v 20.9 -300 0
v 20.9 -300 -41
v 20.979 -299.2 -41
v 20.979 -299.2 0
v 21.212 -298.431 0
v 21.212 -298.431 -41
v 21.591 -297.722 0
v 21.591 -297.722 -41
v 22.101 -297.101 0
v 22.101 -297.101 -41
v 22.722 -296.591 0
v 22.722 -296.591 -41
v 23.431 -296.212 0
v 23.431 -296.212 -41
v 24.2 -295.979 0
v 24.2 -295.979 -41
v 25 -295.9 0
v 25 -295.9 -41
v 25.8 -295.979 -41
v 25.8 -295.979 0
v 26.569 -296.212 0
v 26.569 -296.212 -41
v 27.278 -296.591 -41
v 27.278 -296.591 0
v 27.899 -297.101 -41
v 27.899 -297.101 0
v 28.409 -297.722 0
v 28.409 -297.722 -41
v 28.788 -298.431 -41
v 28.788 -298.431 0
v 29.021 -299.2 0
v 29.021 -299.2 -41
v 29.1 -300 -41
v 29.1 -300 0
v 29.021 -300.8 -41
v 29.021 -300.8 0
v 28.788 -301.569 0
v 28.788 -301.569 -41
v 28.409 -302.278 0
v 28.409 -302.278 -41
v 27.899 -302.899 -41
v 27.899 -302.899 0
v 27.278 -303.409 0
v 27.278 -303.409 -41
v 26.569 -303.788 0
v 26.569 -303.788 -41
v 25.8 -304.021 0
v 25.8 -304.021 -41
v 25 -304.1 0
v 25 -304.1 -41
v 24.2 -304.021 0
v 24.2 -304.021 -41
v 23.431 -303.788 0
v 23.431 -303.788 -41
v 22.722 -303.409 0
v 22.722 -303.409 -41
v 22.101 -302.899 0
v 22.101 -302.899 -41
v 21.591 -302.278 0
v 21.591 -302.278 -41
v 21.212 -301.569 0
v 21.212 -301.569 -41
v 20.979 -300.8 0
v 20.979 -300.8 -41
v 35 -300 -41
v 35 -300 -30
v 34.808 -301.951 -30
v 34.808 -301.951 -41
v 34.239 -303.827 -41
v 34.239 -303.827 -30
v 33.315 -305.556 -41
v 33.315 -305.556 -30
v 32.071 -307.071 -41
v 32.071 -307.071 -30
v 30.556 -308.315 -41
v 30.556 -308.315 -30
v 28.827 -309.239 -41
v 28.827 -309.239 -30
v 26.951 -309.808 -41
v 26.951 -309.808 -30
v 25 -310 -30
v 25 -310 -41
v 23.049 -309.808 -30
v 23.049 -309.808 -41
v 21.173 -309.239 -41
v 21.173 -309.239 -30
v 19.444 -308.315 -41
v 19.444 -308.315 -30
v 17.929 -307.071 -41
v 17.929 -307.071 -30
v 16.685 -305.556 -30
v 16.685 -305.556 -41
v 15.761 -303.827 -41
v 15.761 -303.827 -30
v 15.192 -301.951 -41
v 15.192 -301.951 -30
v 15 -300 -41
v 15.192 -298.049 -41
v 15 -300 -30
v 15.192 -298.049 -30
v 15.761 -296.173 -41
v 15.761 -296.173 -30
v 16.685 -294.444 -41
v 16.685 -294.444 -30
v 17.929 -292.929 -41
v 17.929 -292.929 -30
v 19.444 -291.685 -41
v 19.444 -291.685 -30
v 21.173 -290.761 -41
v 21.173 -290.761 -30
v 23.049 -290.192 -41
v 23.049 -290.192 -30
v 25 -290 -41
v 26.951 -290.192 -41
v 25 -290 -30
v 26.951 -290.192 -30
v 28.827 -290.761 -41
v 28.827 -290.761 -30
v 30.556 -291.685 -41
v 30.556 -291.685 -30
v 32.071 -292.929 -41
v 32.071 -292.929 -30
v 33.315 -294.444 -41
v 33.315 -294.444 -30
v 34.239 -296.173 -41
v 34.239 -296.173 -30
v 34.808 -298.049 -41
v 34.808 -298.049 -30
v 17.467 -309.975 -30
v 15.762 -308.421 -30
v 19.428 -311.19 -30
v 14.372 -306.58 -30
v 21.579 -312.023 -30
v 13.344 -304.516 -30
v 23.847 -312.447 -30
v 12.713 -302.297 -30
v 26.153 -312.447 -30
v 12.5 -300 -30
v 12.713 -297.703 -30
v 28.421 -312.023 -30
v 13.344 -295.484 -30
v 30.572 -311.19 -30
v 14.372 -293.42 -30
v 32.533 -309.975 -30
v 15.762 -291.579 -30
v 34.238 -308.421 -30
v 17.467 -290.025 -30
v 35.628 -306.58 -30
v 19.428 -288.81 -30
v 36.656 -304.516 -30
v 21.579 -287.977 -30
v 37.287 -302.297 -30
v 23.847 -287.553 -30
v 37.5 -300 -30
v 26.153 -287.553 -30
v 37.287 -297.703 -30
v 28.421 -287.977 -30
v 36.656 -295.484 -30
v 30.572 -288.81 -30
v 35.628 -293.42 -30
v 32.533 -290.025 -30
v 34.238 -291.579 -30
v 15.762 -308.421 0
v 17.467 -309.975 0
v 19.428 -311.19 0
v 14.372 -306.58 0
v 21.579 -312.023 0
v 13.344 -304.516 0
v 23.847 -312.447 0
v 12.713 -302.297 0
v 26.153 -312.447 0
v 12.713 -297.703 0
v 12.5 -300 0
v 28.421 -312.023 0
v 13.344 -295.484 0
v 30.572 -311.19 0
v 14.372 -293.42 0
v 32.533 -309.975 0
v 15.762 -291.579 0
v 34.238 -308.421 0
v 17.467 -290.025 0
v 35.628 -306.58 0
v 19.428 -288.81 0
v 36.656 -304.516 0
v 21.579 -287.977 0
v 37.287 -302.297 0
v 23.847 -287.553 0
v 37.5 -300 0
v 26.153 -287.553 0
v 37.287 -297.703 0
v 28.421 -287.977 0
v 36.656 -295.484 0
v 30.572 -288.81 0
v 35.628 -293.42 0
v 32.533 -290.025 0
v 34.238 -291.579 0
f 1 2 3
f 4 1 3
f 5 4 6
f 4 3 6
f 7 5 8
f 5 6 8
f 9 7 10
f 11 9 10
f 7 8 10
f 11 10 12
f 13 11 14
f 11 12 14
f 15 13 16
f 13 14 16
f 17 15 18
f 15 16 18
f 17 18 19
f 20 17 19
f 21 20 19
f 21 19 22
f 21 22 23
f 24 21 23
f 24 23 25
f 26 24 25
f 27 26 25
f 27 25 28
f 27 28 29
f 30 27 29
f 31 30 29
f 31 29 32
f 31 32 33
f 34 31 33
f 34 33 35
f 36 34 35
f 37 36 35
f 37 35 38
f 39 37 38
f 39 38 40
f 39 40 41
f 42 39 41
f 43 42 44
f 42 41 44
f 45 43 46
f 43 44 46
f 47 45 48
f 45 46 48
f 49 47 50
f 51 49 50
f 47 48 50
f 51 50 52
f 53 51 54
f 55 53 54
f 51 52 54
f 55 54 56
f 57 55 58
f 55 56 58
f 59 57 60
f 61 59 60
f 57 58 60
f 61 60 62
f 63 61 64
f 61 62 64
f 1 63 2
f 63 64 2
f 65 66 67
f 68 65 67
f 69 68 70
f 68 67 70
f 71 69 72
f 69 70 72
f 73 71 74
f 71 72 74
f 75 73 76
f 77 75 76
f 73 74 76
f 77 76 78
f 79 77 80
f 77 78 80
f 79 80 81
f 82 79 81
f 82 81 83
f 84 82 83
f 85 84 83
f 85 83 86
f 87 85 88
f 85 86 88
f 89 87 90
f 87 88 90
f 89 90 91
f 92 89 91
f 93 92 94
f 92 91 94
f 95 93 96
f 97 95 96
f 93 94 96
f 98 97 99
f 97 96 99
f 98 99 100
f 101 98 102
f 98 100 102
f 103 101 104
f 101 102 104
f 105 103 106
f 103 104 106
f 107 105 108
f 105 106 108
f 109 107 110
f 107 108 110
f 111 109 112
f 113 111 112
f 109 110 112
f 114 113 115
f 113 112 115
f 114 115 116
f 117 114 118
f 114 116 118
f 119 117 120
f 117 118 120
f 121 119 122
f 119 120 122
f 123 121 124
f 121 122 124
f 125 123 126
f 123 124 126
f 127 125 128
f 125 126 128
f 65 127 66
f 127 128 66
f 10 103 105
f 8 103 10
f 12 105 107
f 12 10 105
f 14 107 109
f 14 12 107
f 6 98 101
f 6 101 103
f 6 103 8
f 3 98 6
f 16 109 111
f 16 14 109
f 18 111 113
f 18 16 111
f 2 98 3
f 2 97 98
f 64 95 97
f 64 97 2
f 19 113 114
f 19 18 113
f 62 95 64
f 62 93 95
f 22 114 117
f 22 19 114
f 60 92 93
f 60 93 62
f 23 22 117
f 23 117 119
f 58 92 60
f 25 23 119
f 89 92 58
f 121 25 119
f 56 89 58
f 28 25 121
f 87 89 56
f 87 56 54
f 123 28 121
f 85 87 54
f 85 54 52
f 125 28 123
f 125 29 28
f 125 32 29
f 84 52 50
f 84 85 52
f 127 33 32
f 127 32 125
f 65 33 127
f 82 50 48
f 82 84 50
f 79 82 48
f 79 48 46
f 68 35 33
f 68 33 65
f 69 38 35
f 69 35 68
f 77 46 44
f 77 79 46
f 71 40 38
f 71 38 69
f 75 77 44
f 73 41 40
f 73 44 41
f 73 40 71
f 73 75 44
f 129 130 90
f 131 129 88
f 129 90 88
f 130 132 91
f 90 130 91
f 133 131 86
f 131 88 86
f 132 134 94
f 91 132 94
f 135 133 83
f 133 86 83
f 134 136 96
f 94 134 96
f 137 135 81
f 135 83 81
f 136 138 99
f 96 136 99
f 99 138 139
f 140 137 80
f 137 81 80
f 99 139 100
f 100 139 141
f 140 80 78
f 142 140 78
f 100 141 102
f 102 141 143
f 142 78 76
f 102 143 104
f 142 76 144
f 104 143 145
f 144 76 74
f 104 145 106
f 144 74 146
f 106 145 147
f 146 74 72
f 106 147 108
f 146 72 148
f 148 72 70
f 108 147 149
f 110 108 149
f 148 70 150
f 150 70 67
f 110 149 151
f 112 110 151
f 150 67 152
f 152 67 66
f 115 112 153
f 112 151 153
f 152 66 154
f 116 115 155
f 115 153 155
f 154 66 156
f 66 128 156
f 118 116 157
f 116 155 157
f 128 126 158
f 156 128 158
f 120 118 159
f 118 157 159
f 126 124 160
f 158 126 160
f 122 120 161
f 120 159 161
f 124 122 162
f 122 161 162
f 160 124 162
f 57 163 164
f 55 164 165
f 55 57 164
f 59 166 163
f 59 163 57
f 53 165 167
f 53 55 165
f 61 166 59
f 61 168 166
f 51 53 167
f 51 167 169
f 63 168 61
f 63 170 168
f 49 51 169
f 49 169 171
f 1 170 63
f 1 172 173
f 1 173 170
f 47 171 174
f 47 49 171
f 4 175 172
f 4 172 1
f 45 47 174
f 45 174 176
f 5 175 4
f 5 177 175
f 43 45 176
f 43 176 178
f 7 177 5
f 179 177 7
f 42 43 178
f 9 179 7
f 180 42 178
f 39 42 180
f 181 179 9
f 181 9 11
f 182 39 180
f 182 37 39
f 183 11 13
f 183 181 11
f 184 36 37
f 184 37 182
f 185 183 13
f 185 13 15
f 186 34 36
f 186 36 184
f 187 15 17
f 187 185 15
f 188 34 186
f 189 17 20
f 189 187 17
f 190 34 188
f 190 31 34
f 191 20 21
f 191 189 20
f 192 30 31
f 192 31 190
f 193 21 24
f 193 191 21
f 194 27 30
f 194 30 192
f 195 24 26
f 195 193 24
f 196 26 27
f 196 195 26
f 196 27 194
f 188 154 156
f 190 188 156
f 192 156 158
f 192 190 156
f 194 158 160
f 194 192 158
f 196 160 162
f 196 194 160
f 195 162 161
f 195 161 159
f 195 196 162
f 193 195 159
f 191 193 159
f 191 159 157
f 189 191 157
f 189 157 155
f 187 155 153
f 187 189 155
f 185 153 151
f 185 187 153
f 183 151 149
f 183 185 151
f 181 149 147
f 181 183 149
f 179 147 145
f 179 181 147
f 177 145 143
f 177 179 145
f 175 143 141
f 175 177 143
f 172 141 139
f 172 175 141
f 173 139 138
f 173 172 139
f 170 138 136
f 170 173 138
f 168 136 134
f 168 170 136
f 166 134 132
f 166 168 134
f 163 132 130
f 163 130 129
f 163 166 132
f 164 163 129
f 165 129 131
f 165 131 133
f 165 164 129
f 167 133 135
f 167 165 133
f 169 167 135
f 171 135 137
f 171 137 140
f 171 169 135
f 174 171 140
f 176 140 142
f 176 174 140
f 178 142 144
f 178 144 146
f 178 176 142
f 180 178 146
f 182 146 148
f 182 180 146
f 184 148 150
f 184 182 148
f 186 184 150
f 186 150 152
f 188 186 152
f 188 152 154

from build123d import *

# Parameters (mm, degrees)
SKETCH1_R           = 12.5
BOSS_EXTRUDE1_DEPTH = 30
SKETCH2_R           = 10
BOSS_EXTRUDE2_DEPTH = 11
SKETCH3_R           = 4.1
CUT_EXTRUDE1_DEPTH  = 318.401165719


with BuildPart() as part:
    # Sketch1 → Boss-Extrude1 (new body)
    with BuildSketch(Plane.XY):
        with Locations((25, -300)):
            Circle(SKETCH1_R)
    extrude(amount=-BOSS_EXTRUDE1_DEPTH)

    # Sketch2 → Boss-Extrude2 (add)
    with BuildSketch(Plane(origin=(0, 0, -30), x_dir=(-1, 0, 0), z_dir=(0, 0, -1))):
        with Locations(Location((-25, -300, 0), (0, 0, 180))):
            Circle(SKETCH2_R)
    extrude(amount=BOSS_EXTRUDE2_DEPTH)

    # Sketch3 → Cut-Extrude1 (cut, through all)
    with BuildSketch(Plane(origin=(0, 0, -41), x_dir=(-1, 0, 0), z_dir=(0, 0, -1))):
        with Locations((-25, -300)):
            Circle(SKETCH3_R)
    extrude(amount=-CUT_EXTRUDE1_DEPTH, mode=Mode.SUBTRACT)


solid = part.part
